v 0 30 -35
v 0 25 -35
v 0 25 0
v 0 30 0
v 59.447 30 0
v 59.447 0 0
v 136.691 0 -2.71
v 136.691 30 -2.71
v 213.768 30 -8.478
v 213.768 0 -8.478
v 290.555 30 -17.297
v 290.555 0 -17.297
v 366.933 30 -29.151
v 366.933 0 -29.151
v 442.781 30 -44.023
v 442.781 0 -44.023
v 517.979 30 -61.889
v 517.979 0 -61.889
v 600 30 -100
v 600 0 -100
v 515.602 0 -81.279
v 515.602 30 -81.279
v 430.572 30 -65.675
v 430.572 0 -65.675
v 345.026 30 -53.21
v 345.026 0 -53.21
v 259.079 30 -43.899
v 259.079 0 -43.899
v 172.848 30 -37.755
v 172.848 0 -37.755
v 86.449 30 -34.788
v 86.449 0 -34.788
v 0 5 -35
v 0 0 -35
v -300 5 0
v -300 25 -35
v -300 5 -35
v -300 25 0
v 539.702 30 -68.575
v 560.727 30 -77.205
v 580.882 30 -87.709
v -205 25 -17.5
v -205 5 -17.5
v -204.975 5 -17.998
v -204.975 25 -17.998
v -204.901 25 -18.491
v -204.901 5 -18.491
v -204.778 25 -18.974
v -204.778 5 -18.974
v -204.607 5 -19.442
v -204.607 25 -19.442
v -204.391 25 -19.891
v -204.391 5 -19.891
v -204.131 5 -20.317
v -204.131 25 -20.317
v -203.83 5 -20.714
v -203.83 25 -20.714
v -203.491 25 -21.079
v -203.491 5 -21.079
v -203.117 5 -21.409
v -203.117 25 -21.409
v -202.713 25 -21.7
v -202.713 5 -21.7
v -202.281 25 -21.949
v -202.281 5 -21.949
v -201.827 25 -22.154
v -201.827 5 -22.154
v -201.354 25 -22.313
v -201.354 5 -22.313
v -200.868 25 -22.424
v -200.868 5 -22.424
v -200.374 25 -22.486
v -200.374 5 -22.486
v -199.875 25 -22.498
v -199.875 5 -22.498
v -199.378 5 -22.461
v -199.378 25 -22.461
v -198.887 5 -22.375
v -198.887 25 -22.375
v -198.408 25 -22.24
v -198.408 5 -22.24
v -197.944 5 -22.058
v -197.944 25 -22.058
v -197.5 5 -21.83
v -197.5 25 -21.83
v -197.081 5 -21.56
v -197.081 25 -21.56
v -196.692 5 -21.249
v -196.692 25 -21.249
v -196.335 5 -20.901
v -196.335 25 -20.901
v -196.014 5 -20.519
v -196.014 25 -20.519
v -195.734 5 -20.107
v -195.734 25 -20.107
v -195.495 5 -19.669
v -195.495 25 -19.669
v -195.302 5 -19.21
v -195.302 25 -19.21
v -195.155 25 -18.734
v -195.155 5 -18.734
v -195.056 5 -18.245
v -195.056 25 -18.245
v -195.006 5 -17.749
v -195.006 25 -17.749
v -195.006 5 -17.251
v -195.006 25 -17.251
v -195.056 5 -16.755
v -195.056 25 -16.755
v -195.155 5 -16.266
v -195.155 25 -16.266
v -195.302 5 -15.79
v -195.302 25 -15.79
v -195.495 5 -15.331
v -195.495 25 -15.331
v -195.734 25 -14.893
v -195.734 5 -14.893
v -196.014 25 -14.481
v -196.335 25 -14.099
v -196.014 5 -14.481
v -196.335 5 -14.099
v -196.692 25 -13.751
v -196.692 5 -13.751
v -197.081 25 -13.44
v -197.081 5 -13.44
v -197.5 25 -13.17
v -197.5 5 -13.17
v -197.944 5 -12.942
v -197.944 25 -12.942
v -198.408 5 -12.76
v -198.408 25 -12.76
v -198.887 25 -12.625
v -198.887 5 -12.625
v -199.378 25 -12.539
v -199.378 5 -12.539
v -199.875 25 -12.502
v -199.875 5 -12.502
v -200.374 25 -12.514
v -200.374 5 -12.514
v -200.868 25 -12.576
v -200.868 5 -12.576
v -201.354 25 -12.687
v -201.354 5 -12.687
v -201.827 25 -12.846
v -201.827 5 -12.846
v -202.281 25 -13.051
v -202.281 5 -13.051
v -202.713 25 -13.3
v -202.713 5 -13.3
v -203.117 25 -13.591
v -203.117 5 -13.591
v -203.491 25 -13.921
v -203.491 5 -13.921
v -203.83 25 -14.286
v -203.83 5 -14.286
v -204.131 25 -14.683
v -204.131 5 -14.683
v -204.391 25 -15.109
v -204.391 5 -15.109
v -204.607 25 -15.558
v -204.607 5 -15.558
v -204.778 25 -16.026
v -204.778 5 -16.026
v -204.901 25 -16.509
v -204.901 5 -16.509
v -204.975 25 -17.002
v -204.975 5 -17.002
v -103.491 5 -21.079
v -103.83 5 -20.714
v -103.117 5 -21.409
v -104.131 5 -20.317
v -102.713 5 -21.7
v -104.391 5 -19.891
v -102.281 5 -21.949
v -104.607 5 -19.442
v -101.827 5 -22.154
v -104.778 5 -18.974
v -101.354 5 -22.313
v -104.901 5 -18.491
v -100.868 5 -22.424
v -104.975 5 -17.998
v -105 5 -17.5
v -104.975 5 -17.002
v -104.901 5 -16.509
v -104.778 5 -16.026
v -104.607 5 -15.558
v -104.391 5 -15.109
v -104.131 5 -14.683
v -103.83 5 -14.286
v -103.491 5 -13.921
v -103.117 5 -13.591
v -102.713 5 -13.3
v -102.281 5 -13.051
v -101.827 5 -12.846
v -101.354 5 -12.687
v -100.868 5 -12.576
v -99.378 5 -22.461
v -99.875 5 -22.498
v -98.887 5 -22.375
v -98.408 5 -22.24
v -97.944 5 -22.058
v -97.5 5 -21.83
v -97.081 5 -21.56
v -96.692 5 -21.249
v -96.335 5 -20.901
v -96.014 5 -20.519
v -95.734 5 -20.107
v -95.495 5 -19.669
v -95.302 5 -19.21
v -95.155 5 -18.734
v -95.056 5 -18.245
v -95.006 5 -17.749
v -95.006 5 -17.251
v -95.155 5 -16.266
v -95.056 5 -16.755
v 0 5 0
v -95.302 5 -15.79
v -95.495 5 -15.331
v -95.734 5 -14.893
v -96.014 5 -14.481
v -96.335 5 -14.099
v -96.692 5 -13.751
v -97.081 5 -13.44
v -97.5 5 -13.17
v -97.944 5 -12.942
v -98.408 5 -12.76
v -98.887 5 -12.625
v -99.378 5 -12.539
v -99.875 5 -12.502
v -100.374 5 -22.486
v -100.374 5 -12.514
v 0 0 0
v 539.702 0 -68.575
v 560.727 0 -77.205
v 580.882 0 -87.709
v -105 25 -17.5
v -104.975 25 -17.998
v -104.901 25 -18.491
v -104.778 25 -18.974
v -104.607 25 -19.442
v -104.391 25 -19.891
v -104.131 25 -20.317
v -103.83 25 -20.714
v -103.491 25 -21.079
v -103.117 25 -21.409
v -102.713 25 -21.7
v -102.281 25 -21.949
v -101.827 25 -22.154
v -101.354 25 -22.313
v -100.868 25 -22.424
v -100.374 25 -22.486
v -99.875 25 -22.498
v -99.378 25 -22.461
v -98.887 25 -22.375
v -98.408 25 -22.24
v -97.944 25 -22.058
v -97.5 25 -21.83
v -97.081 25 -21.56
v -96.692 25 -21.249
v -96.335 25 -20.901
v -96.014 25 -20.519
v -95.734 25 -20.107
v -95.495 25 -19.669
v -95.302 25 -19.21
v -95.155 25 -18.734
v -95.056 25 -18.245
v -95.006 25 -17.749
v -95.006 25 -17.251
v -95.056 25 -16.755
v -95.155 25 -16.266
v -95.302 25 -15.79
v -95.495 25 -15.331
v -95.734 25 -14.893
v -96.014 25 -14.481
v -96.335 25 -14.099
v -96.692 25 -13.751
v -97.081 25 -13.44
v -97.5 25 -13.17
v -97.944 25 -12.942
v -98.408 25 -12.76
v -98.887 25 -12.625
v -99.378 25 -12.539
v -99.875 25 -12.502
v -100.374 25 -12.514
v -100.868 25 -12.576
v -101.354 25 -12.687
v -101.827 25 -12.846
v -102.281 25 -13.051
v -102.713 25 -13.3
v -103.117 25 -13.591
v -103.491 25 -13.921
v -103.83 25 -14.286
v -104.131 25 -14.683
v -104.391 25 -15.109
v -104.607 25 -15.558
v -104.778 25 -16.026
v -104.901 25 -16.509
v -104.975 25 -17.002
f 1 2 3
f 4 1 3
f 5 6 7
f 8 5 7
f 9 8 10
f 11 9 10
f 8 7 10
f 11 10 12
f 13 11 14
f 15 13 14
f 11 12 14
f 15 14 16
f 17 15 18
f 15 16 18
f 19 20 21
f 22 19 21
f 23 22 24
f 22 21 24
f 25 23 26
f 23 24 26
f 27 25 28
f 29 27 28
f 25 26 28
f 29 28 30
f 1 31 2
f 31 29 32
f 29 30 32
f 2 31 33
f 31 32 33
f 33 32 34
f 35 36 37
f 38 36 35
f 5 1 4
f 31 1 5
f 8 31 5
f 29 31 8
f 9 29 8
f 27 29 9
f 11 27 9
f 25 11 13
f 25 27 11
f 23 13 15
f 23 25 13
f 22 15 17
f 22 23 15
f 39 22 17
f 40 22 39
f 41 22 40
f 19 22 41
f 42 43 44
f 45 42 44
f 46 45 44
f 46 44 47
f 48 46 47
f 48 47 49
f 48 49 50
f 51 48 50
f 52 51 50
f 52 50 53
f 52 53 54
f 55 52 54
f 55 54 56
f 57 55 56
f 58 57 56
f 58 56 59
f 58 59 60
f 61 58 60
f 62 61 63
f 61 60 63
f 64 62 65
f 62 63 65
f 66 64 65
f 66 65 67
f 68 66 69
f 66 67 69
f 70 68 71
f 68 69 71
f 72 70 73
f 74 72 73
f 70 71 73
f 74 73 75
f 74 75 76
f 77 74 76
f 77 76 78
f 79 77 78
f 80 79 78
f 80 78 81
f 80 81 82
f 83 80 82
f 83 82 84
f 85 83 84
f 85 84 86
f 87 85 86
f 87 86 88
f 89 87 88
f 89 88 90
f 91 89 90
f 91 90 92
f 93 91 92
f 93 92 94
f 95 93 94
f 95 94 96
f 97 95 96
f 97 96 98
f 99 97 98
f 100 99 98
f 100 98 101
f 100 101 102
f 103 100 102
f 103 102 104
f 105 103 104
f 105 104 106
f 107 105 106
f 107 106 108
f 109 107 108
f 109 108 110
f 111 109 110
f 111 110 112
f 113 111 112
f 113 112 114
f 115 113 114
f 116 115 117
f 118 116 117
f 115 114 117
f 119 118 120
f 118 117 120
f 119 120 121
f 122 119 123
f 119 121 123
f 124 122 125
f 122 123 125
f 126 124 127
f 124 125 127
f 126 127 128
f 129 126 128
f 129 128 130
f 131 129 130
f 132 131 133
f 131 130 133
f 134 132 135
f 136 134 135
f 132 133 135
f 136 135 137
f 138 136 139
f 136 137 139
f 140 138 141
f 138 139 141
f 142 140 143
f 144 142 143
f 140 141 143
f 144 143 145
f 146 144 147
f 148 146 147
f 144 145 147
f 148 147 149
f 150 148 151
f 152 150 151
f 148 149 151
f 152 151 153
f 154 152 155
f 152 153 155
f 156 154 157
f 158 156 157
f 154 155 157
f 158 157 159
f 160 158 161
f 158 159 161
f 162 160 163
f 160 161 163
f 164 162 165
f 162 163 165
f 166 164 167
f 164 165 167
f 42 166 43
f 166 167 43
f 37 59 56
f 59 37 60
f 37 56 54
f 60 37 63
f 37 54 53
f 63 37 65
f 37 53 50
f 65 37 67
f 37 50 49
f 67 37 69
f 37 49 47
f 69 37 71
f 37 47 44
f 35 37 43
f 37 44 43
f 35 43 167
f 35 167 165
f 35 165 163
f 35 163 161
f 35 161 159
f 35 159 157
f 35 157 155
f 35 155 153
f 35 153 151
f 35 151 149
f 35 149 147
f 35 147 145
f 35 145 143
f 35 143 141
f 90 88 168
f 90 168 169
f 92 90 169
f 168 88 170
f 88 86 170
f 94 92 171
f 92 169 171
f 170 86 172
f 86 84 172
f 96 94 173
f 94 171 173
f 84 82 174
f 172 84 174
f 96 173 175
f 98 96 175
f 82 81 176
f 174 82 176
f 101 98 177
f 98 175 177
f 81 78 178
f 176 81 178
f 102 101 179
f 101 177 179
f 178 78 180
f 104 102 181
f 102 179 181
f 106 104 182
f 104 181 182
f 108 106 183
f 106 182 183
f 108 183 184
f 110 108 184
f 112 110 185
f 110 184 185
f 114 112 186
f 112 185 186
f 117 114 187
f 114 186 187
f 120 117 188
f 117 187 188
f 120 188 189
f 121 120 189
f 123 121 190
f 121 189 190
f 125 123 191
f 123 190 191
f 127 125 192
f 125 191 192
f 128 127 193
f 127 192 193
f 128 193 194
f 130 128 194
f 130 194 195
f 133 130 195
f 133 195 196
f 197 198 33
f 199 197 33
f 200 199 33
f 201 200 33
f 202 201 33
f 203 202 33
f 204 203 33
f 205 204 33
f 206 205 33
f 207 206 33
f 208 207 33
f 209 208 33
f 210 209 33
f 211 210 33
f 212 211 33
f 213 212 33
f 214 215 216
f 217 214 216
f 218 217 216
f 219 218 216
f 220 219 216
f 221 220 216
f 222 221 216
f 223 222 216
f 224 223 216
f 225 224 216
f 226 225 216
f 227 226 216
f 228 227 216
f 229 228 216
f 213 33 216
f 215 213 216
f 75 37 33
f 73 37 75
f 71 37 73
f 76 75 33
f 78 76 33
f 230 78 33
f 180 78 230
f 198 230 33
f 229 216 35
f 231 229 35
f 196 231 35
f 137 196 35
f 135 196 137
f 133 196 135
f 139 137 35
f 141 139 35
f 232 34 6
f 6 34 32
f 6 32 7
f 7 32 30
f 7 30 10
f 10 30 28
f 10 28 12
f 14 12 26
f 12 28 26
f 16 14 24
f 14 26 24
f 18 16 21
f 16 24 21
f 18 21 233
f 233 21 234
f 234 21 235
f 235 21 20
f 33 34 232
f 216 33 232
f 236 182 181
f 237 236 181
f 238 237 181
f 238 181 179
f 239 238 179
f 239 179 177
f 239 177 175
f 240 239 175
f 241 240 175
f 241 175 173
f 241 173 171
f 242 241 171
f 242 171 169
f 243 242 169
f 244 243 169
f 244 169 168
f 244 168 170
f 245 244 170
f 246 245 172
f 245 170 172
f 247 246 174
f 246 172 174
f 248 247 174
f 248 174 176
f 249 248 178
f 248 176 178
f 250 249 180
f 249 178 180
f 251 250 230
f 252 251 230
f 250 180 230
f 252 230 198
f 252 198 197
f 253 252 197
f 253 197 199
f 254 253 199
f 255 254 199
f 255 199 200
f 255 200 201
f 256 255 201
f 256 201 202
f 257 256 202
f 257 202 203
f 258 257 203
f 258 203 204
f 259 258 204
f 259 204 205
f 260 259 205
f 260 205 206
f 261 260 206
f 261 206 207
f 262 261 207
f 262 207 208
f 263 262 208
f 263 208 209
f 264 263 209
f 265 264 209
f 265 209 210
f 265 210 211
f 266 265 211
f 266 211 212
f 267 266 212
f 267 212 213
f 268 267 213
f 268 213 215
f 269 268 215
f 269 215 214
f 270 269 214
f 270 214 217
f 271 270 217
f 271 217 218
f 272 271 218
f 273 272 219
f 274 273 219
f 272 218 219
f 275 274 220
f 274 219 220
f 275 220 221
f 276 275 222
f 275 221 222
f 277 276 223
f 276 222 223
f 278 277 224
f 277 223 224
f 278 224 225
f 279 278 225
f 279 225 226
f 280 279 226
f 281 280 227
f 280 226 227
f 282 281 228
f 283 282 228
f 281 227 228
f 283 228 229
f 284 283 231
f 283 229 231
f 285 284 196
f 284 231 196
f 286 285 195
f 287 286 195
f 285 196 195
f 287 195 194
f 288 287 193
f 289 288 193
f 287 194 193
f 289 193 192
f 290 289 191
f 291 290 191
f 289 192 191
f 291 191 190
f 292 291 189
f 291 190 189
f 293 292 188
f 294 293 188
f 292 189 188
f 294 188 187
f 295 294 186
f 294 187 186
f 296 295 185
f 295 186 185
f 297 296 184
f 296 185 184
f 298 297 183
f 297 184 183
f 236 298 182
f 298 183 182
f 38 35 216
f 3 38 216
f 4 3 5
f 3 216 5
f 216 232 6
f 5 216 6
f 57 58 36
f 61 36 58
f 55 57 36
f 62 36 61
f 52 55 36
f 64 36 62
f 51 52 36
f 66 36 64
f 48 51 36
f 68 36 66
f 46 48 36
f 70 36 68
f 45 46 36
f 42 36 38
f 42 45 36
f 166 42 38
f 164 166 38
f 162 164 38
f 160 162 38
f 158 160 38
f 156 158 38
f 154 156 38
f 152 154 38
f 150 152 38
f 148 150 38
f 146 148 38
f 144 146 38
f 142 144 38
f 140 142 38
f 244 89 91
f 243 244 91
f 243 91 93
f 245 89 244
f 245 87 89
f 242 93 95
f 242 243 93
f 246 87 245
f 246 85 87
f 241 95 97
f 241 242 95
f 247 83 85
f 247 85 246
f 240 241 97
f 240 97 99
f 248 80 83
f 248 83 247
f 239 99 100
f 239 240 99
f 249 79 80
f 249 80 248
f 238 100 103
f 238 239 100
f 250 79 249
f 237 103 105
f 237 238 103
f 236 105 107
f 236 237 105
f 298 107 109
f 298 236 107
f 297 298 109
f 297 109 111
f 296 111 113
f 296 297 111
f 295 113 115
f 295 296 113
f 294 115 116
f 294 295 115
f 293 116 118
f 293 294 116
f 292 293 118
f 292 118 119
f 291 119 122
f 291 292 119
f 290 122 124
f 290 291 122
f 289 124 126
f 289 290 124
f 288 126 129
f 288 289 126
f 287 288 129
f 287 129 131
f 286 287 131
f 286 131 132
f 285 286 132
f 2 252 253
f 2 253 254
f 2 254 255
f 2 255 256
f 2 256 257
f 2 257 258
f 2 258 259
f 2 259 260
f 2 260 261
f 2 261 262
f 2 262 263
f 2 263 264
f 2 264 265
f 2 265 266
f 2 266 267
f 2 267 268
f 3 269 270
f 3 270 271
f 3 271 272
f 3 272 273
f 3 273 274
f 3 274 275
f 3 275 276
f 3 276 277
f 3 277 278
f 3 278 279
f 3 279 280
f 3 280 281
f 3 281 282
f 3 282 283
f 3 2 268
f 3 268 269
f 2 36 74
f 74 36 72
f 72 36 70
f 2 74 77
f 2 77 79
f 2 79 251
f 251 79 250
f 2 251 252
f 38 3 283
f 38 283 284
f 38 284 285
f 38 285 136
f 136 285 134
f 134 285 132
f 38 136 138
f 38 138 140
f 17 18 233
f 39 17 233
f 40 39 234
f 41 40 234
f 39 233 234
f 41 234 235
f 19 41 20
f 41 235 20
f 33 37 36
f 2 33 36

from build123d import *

# Parameters (mm, degrees)
BOSS_EXTRUDE1_DEPTH    = 30
SKETCH2_W              = 35
SKETCH2_H              = 20
BOSS_EXTRUDE2_DEPTH    = 300
F_10_0MM_DOWEL_HOLE1_D = 10


with BuildPart() as part:
    # Sketch1 → Boss-Extrude1 (new body)
    with BuildSketch(Plane(origin=(0, 0, 0), x_dir=(1, 0, 0), z_dir=(0, 1, 0))):
        with BuildLine():
            Line((0, 35), (0, 0))
            Line((0, 0), (59.446550687, 0))
            ThreePointArc((59.446550687, 0), (290.555085126, 17.296607549), (517.979369235, 61.889458105))
            ThreePointArc((517.979369235, 61.889458105), (560.727418369, 77.204818483), (600, 100))
            ThreePointArc((600, 100), (302.095278427, 48.158968364), (0, 35))
        make_face()
    extrude(amount=BOSS_EXTRUDE1_DEPTH)

    # Sketch2 → Boss-Extrude2 (add)
    with BuildSketch(Plane.ZY):
        with Locations((-17.5, 15)):
            Rectangle(SKETCH2_W, SKETCH2_H)
    extrude(amount=BOSS_EXTRUDE2_DEPTH)

    # Ø10.0mm Dowel Hole1 (through all)
    with Locations(Plane(origin=(0, 25, 0), x_dir=(1, 0, 0), z_dir=(0, 1, 0))):
        with Locations((-200, 17.5), (-100, 17.5)):
            Hole(F_10_0MM_DOWEL_HOLE1_D / 2)


solid = part.part
